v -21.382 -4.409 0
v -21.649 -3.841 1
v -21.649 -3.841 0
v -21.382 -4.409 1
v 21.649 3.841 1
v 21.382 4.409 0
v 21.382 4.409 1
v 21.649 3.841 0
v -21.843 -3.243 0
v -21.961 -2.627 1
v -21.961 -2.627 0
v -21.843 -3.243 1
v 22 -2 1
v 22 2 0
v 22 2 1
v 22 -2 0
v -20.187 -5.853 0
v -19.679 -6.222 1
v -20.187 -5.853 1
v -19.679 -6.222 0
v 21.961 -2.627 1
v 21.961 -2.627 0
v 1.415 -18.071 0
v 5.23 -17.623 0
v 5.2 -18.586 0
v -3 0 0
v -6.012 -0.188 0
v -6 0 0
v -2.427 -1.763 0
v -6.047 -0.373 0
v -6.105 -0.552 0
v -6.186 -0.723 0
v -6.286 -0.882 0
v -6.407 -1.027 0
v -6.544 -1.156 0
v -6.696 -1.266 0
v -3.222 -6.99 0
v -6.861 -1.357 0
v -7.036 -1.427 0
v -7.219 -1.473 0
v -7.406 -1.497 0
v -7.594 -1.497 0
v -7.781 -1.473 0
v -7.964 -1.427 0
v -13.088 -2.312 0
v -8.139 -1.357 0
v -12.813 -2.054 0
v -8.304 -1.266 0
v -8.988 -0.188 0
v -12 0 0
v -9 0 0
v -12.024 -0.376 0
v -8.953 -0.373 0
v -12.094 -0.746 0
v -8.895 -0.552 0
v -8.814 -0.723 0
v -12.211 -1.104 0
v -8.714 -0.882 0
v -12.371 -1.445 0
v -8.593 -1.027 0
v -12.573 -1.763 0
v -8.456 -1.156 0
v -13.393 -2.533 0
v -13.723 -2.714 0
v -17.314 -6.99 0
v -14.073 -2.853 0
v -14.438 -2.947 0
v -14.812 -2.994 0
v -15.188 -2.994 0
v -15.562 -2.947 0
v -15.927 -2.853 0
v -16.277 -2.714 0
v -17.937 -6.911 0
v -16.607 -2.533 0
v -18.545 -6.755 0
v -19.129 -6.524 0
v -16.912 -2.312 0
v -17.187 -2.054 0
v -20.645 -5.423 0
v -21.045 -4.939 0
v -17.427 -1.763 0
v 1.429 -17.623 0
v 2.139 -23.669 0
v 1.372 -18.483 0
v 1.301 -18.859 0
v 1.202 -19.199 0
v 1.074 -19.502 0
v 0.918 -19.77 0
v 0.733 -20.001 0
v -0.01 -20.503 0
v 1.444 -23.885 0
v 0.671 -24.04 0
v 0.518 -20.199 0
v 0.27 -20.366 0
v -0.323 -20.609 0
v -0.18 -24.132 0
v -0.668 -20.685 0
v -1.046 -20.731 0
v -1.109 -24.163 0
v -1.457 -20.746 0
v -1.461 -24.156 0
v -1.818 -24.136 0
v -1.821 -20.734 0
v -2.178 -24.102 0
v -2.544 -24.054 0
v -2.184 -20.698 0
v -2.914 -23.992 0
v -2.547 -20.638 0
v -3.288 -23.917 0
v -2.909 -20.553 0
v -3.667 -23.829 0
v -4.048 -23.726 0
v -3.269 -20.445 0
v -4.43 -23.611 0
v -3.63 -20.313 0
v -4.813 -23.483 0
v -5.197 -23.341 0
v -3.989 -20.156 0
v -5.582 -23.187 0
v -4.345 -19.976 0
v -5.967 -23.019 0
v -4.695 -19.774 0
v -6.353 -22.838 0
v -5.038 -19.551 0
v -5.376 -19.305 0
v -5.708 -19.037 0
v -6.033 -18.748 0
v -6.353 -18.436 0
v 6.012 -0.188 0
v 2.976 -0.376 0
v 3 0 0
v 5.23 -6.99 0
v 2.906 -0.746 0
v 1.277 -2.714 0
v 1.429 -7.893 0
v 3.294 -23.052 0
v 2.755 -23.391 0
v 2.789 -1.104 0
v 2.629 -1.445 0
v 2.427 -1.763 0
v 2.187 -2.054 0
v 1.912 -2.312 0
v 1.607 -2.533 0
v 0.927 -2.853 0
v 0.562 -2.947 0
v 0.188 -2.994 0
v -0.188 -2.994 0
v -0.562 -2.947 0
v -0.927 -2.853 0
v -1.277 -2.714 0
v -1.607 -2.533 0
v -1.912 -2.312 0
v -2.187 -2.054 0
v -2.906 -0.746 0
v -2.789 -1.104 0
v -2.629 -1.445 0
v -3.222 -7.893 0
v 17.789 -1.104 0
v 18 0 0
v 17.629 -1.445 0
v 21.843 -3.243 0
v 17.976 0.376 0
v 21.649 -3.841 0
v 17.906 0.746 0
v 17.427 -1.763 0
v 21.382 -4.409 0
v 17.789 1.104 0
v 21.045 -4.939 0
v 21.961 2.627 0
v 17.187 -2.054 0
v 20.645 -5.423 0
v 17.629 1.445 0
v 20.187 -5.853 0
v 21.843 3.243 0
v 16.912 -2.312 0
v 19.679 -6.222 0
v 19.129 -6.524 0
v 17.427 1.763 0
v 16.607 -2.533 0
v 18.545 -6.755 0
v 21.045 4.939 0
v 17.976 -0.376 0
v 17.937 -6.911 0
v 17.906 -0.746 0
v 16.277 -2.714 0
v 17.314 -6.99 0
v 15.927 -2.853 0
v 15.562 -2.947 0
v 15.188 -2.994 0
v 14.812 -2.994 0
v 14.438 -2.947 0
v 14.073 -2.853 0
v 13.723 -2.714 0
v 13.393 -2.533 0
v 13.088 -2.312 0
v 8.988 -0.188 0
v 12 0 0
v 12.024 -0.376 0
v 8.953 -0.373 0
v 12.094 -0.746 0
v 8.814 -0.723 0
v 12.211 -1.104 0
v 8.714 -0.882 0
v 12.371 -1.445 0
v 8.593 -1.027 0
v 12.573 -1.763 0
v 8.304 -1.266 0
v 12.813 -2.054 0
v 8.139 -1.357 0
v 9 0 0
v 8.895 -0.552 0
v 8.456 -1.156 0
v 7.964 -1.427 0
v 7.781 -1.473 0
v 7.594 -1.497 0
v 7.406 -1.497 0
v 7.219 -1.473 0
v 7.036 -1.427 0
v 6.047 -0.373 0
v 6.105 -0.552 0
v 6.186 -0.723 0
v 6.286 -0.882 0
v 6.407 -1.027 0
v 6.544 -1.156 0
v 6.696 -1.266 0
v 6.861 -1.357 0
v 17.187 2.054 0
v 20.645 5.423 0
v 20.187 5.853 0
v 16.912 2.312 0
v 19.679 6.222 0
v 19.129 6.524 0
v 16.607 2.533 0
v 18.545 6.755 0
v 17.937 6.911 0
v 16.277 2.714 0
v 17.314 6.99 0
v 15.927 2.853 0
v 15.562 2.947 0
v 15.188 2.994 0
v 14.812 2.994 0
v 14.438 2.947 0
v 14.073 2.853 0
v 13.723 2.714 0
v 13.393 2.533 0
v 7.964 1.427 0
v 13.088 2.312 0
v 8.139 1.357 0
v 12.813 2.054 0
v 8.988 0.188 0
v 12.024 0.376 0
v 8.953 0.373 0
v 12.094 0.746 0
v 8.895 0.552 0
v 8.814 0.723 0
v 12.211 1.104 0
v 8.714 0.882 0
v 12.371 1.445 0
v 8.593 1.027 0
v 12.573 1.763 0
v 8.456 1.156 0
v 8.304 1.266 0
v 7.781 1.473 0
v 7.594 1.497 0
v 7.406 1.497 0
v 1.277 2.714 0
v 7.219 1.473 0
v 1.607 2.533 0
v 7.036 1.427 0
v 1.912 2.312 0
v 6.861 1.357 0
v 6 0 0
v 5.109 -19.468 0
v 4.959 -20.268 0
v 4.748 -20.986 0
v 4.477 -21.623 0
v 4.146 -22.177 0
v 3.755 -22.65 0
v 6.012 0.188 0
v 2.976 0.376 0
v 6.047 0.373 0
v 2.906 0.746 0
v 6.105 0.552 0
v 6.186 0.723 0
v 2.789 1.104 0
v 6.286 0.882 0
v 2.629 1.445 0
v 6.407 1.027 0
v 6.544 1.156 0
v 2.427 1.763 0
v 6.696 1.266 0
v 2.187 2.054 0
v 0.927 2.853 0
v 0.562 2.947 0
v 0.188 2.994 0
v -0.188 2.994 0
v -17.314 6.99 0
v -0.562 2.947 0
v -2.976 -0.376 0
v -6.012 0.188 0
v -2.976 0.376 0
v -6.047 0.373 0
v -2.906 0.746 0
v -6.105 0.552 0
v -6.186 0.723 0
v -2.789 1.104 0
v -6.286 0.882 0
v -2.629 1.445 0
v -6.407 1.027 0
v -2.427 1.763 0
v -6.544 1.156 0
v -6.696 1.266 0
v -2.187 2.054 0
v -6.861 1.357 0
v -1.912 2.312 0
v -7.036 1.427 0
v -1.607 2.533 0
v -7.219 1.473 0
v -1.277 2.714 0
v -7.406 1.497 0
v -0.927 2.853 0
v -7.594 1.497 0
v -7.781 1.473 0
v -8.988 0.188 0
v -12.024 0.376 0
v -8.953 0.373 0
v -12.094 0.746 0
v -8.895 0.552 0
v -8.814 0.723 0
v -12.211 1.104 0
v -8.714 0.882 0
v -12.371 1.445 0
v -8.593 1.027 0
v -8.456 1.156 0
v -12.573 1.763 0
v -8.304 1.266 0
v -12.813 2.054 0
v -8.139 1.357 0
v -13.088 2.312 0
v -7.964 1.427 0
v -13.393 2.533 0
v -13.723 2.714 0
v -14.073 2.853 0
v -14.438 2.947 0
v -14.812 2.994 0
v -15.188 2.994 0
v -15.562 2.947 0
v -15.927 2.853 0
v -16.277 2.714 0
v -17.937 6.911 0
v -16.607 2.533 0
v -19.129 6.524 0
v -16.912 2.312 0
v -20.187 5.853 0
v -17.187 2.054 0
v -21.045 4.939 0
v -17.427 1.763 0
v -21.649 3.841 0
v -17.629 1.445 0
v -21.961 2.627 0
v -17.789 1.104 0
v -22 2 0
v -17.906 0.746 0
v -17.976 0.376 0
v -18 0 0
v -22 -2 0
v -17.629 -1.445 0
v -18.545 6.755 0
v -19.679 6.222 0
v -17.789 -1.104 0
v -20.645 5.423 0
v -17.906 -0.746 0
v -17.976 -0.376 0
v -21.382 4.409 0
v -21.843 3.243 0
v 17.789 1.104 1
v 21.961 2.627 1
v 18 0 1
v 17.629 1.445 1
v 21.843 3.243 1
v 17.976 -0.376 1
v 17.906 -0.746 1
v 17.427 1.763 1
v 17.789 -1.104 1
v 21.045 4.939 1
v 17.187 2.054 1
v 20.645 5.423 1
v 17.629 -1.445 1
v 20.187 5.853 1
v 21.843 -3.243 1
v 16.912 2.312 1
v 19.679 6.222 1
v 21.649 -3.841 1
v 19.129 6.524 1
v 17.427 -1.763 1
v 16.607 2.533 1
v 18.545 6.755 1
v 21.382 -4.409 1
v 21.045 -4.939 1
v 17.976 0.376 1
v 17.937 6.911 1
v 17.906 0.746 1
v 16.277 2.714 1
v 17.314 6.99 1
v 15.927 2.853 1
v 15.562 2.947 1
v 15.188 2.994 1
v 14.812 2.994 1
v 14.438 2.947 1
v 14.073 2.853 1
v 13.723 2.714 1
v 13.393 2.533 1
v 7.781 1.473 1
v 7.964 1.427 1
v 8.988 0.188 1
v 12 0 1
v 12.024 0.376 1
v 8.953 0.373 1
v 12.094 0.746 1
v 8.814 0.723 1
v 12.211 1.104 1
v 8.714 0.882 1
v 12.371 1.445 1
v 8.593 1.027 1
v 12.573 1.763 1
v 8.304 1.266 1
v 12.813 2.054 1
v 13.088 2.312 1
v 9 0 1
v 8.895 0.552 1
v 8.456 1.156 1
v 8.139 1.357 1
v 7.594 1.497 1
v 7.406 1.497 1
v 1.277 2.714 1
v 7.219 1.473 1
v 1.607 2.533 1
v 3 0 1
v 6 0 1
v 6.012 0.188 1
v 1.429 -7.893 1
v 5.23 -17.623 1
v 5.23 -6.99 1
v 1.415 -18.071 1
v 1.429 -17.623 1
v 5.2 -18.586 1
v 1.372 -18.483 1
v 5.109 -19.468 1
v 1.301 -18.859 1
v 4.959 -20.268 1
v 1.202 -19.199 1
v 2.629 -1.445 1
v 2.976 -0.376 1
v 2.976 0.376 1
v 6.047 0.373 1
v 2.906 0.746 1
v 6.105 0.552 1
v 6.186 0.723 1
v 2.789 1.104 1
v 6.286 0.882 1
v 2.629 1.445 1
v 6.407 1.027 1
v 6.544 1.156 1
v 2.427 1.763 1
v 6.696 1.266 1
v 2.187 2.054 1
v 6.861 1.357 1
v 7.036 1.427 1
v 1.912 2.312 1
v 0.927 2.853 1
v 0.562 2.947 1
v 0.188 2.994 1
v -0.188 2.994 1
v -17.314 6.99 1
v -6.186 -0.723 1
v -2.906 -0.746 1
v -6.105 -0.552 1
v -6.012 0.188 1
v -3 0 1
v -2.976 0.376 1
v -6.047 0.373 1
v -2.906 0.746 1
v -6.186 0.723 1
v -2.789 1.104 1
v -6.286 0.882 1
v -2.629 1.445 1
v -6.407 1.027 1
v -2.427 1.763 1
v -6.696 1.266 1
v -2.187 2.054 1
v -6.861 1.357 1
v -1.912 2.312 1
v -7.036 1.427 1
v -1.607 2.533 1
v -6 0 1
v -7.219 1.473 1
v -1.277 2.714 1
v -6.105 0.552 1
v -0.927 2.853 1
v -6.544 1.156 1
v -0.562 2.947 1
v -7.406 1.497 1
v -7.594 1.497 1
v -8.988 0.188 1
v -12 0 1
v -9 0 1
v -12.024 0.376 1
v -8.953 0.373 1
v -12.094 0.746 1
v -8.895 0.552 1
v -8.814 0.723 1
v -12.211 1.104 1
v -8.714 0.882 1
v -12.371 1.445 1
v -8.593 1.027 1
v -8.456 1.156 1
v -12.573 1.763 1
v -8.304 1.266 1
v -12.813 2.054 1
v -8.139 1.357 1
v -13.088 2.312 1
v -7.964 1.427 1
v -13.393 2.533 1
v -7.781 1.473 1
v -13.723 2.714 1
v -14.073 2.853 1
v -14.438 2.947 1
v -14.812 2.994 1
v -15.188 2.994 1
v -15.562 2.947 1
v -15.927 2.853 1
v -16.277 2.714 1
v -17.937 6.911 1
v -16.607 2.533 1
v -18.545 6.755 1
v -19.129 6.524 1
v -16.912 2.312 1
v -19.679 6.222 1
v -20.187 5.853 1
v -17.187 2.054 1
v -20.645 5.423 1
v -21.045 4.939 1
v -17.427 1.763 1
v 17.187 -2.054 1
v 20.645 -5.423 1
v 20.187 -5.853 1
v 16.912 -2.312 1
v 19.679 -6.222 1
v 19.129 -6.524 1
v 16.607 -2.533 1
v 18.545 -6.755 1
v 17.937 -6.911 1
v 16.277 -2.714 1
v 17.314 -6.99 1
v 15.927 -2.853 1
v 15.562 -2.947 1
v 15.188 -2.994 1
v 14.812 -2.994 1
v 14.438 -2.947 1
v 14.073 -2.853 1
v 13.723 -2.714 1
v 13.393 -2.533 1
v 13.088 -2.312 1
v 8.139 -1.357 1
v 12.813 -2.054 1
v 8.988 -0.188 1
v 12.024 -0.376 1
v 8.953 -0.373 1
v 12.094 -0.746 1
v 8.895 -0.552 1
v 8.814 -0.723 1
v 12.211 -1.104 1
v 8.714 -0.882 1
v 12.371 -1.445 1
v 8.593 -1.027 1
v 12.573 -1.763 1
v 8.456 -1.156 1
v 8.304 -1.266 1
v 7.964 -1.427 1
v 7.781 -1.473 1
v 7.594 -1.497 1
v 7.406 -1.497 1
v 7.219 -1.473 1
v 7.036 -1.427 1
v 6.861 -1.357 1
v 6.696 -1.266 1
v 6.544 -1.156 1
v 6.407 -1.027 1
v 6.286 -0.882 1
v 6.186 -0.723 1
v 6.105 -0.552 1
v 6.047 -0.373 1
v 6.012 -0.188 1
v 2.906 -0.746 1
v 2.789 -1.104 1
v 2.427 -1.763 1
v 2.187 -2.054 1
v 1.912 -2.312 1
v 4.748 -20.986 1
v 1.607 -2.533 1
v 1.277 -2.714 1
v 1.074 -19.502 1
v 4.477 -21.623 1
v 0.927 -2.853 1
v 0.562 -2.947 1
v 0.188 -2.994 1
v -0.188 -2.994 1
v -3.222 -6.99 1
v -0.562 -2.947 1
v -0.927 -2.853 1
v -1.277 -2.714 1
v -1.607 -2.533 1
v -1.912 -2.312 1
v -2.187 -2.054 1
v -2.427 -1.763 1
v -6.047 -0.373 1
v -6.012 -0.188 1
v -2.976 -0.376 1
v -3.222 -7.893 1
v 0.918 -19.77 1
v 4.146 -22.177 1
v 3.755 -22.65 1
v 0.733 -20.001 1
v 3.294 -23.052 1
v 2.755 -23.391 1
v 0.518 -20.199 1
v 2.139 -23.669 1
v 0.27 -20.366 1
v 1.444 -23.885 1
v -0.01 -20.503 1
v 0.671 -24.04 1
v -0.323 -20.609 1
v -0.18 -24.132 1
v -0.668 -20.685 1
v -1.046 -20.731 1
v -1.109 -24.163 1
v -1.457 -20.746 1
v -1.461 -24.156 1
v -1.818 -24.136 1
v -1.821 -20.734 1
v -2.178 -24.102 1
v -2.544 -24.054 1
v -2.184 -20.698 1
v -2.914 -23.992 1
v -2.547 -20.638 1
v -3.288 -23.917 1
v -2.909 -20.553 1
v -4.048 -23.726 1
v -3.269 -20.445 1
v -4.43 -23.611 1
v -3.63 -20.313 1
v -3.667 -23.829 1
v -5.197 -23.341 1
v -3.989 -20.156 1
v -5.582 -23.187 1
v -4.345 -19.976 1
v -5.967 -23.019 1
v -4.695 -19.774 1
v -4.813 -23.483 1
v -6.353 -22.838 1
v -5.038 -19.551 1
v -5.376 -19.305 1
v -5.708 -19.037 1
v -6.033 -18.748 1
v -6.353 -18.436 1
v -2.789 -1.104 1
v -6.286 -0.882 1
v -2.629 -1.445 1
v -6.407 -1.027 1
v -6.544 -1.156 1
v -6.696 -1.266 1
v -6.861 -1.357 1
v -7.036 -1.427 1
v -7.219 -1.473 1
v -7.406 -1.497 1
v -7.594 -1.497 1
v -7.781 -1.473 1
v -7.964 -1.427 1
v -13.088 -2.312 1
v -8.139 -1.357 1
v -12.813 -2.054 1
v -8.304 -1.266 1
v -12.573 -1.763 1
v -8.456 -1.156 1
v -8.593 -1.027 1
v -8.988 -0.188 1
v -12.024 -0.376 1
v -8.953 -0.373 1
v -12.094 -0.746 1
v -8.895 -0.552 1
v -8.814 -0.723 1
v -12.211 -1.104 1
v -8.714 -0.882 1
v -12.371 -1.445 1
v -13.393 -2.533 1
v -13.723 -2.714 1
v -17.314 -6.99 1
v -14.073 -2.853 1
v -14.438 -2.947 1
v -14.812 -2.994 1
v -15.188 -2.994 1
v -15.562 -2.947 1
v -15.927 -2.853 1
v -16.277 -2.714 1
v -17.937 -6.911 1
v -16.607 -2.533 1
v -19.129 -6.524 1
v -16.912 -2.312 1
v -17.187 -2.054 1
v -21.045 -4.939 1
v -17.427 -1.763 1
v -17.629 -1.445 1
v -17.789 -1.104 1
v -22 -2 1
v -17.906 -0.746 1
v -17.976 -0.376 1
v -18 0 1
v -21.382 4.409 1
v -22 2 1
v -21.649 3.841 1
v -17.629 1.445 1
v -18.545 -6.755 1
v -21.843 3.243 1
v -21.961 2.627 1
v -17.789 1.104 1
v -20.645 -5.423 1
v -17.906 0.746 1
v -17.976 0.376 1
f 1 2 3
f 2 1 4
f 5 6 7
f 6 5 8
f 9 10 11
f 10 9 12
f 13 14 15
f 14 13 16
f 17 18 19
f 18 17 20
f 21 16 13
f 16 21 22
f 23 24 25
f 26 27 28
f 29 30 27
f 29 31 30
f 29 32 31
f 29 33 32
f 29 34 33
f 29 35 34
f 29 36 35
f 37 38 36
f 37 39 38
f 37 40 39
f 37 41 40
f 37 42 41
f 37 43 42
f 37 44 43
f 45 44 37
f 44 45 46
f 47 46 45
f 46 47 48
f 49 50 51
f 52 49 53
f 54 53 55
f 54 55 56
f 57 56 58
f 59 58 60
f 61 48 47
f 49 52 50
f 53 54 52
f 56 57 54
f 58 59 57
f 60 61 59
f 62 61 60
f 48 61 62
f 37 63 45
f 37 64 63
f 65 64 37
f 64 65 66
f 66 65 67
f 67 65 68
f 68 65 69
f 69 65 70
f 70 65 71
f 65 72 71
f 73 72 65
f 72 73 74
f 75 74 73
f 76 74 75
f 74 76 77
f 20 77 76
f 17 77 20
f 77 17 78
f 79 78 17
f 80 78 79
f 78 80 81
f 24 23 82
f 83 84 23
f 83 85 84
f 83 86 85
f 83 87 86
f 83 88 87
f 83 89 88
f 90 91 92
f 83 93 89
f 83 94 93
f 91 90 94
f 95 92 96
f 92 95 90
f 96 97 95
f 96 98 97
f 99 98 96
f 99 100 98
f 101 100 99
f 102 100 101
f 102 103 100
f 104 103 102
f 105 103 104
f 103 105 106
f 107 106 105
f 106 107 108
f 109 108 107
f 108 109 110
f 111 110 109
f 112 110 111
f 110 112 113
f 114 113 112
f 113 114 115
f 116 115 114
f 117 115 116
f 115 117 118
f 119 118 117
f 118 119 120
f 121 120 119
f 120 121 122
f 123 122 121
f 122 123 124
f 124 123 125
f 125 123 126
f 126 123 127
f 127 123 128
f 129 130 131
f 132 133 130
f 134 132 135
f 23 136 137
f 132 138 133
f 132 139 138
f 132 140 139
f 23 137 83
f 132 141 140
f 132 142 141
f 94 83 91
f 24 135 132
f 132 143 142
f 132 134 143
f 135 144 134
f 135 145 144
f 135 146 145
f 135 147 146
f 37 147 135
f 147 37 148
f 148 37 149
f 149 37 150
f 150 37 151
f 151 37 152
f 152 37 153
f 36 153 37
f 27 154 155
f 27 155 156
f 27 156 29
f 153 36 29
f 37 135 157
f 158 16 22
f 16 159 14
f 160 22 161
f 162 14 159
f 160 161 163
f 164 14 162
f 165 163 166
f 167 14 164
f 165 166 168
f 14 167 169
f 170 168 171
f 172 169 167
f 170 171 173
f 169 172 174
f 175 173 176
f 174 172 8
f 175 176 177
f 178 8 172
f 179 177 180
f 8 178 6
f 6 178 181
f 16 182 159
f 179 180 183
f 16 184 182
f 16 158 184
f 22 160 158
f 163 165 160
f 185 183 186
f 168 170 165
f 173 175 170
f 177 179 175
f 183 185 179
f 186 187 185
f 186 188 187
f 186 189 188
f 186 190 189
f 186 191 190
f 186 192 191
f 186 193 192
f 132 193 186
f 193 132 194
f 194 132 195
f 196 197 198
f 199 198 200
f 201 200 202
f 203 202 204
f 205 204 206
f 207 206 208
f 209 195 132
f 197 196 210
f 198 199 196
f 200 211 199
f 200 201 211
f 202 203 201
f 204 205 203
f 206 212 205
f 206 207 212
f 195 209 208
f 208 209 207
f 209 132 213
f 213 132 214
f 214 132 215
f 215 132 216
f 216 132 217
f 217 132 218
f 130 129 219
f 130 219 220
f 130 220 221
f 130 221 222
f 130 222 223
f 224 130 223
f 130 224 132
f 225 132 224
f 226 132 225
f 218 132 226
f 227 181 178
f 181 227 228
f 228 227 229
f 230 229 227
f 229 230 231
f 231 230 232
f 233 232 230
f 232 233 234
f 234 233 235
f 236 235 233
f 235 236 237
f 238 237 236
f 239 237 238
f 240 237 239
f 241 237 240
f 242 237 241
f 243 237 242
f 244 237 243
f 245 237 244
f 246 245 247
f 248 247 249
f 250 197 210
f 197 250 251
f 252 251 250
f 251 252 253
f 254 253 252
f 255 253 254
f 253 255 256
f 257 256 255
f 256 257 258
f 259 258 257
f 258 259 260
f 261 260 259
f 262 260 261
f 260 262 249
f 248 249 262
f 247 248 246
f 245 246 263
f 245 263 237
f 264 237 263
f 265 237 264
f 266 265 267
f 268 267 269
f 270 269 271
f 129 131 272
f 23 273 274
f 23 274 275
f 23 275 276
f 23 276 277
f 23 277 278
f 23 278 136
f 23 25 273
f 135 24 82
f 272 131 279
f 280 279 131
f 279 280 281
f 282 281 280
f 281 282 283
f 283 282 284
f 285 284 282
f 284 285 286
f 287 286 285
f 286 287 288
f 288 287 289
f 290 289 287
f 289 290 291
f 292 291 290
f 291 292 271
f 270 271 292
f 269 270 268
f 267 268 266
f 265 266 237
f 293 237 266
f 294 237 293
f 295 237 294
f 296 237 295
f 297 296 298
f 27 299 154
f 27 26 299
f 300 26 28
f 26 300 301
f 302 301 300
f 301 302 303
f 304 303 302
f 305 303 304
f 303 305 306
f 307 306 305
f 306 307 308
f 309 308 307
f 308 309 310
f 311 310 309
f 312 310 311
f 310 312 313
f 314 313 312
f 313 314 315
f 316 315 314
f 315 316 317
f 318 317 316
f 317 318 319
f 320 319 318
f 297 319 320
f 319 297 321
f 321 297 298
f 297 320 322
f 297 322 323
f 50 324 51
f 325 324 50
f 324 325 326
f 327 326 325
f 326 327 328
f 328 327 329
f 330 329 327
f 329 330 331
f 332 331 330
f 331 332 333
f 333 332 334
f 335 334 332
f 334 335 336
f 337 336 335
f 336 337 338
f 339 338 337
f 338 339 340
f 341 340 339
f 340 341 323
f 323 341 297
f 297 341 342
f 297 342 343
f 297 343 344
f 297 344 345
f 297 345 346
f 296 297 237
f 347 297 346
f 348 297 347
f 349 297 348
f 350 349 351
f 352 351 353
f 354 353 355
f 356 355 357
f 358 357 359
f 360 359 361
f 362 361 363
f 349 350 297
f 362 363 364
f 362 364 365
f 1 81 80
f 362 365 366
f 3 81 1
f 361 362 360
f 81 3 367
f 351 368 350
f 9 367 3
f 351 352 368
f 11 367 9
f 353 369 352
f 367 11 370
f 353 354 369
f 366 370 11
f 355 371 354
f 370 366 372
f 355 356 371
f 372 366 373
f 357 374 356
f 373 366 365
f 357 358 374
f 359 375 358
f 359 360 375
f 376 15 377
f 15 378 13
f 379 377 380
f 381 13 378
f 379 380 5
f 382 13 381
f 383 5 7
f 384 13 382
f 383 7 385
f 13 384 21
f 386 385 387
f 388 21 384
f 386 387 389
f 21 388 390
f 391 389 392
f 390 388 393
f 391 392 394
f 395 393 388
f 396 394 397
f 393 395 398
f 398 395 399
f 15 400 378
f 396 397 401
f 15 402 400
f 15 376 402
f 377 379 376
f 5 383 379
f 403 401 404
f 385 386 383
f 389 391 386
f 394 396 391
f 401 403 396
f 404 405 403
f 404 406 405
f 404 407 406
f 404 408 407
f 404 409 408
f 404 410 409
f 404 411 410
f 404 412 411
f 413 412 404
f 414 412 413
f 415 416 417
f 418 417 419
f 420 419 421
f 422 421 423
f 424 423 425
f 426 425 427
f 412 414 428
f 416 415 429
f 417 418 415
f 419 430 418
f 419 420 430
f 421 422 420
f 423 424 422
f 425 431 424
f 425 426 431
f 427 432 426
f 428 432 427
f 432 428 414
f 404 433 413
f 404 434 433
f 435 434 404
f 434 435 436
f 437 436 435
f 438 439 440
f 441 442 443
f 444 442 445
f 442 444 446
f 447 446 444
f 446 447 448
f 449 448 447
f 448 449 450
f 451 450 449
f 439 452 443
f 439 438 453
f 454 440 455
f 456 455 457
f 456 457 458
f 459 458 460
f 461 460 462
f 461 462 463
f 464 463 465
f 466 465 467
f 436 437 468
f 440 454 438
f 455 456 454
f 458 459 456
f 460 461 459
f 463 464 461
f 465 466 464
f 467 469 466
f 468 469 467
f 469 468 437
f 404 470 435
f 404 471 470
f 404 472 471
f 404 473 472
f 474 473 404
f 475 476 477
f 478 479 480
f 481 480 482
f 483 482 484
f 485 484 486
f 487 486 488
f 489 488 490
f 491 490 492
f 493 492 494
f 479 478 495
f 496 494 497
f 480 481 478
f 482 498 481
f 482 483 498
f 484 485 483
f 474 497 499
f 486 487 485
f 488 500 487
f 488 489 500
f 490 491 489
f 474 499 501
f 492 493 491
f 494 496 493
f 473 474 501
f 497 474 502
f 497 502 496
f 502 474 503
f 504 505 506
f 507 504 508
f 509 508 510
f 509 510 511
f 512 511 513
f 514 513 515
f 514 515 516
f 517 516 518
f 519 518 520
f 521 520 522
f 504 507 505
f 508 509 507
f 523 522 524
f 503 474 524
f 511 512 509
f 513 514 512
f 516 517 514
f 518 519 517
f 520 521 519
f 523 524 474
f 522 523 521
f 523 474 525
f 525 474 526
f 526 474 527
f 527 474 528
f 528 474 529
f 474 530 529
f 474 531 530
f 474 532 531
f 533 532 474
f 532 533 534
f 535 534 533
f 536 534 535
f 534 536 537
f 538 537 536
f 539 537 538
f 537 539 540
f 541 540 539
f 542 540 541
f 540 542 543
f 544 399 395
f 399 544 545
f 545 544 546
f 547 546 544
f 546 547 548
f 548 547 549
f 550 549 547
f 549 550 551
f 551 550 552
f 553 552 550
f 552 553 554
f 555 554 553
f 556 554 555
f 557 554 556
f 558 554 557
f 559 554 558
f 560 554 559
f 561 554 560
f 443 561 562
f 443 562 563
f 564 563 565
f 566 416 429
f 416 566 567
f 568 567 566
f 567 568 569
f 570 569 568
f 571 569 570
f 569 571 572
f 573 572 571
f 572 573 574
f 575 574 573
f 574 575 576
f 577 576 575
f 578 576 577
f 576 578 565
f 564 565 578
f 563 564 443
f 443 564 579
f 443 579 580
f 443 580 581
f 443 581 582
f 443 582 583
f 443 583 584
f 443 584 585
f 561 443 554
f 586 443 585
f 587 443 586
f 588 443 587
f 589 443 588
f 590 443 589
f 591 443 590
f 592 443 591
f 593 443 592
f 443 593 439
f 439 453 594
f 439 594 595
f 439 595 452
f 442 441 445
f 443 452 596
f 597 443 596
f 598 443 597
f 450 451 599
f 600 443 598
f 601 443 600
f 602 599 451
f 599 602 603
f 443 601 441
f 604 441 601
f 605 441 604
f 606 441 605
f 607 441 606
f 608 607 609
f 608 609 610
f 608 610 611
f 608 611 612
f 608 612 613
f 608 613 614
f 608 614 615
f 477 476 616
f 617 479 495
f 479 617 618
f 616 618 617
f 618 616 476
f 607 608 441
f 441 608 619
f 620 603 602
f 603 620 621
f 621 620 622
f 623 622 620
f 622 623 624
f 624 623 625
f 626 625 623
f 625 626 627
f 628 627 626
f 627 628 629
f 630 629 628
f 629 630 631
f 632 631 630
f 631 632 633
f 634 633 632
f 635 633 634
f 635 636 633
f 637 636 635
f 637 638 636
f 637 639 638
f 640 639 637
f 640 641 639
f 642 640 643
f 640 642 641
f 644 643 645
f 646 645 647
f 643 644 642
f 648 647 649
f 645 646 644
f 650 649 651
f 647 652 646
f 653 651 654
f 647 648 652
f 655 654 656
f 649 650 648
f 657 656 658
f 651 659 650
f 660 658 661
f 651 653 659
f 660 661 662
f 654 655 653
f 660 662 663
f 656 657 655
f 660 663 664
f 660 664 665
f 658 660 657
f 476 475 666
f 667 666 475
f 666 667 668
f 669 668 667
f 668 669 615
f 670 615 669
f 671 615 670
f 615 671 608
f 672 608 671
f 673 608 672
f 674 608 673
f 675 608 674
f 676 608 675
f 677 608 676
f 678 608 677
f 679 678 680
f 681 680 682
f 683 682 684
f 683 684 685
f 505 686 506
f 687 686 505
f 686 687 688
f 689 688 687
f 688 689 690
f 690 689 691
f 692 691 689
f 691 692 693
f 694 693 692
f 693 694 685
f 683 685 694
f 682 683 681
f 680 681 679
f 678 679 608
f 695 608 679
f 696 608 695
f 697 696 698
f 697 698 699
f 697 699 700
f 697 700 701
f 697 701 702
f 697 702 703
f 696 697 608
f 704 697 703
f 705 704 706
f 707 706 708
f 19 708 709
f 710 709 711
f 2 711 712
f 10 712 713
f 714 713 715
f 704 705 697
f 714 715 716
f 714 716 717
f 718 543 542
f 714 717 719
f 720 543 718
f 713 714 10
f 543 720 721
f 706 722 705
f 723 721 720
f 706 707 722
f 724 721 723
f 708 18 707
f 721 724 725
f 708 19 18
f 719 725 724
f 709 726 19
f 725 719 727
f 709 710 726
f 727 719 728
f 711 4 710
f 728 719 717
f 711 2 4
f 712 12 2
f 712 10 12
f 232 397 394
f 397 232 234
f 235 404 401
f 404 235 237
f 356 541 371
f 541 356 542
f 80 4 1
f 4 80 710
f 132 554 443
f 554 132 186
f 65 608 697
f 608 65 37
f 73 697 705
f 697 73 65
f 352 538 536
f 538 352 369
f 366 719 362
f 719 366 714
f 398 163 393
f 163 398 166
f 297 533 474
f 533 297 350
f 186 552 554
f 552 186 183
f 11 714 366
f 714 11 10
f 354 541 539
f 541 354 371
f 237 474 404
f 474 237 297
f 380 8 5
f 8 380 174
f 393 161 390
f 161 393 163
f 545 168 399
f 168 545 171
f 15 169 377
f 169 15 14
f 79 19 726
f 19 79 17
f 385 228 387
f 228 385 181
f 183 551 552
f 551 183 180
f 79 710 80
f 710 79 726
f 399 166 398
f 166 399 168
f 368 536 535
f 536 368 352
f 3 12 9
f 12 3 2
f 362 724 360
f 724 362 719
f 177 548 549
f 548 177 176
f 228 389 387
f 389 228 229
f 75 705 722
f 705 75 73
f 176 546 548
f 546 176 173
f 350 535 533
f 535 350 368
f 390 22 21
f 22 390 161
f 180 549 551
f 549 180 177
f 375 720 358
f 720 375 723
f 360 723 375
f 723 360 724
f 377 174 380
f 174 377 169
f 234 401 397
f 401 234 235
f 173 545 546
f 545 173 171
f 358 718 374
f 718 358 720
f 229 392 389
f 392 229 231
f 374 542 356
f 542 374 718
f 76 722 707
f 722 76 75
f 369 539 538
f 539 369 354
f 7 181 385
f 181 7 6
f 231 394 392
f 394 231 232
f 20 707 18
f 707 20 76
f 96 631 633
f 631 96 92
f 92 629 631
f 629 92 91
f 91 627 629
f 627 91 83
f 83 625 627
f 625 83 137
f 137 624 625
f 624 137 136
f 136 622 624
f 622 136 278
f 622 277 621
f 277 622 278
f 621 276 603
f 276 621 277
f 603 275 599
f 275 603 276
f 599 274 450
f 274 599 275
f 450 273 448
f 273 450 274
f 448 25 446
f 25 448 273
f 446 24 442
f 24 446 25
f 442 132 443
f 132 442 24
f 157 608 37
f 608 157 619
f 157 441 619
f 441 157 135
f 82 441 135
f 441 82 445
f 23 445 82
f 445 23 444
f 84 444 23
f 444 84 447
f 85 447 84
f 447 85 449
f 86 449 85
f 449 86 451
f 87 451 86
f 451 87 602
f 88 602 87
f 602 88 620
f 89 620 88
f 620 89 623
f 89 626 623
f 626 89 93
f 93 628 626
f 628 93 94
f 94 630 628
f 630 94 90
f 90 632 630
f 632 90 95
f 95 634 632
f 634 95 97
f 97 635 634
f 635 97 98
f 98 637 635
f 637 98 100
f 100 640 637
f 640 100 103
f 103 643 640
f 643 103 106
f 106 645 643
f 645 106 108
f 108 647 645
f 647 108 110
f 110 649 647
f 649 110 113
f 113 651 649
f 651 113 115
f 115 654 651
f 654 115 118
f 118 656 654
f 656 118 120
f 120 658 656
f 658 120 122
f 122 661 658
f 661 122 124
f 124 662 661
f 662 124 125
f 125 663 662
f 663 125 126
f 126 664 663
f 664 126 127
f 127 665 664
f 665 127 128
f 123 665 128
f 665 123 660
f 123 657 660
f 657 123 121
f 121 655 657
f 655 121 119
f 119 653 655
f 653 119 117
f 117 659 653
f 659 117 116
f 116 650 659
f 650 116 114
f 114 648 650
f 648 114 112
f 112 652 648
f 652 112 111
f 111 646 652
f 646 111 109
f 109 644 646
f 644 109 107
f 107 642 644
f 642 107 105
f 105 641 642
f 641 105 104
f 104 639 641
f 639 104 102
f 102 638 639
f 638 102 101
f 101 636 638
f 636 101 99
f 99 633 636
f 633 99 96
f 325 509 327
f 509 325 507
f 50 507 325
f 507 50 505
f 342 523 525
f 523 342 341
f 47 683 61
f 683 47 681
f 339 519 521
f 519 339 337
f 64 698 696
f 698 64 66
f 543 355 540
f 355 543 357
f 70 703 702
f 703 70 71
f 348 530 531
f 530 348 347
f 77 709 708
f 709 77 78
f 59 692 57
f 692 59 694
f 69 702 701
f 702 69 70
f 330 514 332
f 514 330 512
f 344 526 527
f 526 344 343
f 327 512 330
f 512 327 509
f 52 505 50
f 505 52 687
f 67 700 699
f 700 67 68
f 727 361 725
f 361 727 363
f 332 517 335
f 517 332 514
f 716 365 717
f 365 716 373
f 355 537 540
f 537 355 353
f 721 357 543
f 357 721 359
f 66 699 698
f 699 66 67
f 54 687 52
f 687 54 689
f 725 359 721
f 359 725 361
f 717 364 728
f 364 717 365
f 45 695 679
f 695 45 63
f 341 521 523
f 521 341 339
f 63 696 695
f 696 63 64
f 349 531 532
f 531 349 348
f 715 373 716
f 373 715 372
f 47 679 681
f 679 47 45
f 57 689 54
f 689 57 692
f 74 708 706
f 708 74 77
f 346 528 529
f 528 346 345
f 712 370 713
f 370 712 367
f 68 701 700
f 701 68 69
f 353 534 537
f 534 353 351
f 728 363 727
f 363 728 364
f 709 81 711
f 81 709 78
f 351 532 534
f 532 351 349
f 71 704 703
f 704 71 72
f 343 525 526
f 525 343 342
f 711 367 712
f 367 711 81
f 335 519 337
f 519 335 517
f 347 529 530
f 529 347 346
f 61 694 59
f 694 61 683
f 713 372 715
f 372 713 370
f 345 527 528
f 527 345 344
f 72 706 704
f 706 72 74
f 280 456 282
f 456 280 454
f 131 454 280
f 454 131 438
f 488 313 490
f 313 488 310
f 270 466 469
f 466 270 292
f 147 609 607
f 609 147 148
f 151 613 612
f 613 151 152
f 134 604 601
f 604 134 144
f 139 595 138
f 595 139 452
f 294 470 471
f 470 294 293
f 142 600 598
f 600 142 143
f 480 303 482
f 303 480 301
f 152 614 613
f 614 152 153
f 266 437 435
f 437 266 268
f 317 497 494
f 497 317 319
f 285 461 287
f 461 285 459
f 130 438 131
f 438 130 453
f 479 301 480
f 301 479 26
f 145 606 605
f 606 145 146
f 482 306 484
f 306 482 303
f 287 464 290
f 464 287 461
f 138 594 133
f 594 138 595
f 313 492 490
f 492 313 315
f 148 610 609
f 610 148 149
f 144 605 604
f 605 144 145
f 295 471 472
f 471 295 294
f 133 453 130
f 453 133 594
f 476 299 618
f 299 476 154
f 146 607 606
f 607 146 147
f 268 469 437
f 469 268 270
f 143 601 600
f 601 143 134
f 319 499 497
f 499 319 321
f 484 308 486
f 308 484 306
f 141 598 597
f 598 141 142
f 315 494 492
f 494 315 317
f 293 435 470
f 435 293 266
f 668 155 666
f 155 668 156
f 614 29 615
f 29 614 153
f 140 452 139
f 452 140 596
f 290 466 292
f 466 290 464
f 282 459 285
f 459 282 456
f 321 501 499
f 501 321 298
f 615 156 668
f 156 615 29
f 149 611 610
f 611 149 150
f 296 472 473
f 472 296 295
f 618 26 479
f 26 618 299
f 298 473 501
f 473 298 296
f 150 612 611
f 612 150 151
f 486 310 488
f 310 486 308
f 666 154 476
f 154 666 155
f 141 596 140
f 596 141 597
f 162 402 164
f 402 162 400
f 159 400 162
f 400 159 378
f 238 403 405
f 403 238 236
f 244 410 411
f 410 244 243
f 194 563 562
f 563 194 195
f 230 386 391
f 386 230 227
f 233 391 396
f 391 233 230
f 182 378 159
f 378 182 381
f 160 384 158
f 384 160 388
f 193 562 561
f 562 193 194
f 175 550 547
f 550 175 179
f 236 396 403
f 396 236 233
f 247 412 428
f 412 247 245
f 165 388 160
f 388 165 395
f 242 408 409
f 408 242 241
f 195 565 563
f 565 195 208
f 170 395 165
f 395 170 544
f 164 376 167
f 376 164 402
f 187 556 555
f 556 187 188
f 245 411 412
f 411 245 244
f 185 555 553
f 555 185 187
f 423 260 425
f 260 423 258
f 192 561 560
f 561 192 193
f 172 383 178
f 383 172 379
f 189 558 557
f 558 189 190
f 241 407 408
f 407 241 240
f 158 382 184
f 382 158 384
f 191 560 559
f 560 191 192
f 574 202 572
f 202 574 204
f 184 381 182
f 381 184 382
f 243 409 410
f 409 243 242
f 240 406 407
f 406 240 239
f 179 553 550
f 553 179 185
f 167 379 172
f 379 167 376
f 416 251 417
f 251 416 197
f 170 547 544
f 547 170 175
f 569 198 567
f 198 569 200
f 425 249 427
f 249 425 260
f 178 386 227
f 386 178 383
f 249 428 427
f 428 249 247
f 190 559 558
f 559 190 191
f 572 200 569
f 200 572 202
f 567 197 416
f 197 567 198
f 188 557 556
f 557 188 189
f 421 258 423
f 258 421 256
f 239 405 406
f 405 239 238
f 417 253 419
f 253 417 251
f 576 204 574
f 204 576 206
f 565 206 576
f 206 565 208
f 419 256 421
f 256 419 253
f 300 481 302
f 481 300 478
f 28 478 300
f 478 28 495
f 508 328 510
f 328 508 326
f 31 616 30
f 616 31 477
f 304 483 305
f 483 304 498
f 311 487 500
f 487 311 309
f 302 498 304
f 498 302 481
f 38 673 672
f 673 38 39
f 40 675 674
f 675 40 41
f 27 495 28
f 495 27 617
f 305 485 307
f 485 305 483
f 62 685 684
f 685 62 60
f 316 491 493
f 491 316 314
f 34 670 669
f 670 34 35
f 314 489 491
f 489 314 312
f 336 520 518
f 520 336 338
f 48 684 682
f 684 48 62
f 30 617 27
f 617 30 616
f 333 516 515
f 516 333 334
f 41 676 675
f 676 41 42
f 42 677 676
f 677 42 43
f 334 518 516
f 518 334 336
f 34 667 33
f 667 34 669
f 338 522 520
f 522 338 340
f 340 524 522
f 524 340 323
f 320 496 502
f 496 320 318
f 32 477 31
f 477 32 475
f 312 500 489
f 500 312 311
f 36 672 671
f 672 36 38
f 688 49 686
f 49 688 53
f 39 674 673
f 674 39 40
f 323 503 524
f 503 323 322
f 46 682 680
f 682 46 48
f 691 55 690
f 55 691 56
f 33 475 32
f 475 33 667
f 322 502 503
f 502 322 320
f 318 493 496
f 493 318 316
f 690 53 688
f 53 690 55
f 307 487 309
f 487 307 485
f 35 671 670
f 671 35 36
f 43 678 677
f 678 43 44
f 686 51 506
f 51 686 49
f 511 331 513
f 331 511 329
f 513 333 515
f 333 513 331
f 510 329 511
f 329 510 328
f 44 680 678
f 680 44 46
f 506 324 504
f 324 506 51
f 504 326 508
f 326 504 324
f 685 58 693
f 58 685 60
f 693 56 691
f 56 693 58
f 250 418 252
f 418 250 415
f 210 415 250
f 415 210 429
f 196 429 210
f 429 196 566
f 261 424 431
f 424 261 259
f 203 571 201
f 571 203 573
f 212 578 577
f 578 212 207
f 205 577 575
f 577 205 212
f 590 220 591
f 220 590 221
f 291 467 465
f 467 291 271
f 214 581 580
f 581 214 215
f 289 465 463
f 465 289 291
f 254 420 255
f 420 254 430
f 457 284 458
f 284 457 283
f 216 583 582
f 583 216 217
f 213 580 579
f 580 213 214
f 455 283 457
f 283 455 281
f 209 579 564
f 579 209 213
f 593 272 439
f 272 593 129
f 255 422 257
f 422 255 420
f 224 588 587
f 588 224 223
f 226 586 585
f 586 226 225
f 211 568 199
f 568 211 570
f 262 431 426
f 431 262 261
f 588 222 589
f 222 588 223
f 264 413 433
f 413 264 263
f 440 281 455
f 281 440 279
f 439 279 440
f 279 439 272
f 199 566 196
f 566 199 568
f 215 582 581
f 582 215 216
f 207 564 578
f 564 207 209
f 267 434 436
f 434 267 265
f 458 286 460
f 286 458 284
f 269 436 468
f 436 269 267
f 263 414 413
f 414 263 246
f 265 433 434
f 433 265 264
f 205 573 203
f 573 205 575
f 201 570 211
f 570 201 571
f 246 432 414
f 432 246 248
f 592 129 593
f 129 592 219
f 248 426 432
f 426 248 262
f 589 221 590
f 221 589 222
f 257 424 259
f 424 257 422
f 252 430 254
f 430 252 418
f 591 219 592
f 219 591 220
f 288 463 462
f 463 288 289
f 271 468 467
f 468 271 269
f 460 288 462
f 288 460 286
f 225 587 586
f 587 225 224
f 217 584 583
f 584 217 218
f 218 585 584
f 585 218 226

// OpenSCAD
$fn = 50;


difference() {
	union() {
		hull() {
			translate(v = [-17.0000000000, 2.0000000000, 0]) {
				cylinder(h = 1, r = 5);
			}
			translate(v = [17.0000000000, 2.0000000000, 0]) {
				cylinder(h = 1, r = 5);
			}
			translate(v = [-17.0000000000, -2.0000000000, 0]) {
				cylinder(h = 1, r = 5);
			}
			translate(v = [17.0000000000, -2.0000000000, 0]) {
				cylinder(h = 1, r = 5);
			}
		}
		translate(v = [0, -5, 0]) {
			linear_extrude(height = 1) {
				text(font = "DejaVu Sans Mono:style=Bold", halign = "center", size = 19.0000000000, text = "J", valign = "top");
			}
		}
	}
	union() {
		translate(v = [-15.0000000000, 0.0000000000, 0]) {
			translate(v = [0, 0, -100]) {
				cylinder(h = 200, r = 3.0000000000);
			}
		}
		translate(v = [0, 0, -100]) {
			cylinder(h = 200, r = 3.0000000000);
		}
		translate(v = [15.0000000000, 0.0000000000, 0]) {
			translate(v = [0, 0, -100]) {
				cylinder(h = 200, r = 3.0000000000);
			}
		}
		translate(v = [-15.0000000000, 0.0000000000, 0]) {
			translate(v = [0, 0, -100]) {
				cylinder(h = 200, r = 1.5000000000);
			}
		}
		translate(v = [-7.5000000000, 0.0000000000, 0]) {
			translate(v = [0, 0, -100]) {
				cylinder(h = 200, r = 1.5000000000);
			}
		}
		translate(v = [0, 0, -100]) {
			cylinder(h = 200, r = 1.5000000000);
		}
		translate(v = [7.5000000000, 0.0000000000, 0]) {
			translate(v = [0, 0, -100]) {
				cylinder(h = 200, r = 1.5000000000);
			}
		}
		translate(v = [15.0000000000, 0.0000000000, 0]) {
			translate(v = [0, 0, -100]) {
				cylinder(h = 200, r = 1.5000000000);
			}
		}
	}
}
